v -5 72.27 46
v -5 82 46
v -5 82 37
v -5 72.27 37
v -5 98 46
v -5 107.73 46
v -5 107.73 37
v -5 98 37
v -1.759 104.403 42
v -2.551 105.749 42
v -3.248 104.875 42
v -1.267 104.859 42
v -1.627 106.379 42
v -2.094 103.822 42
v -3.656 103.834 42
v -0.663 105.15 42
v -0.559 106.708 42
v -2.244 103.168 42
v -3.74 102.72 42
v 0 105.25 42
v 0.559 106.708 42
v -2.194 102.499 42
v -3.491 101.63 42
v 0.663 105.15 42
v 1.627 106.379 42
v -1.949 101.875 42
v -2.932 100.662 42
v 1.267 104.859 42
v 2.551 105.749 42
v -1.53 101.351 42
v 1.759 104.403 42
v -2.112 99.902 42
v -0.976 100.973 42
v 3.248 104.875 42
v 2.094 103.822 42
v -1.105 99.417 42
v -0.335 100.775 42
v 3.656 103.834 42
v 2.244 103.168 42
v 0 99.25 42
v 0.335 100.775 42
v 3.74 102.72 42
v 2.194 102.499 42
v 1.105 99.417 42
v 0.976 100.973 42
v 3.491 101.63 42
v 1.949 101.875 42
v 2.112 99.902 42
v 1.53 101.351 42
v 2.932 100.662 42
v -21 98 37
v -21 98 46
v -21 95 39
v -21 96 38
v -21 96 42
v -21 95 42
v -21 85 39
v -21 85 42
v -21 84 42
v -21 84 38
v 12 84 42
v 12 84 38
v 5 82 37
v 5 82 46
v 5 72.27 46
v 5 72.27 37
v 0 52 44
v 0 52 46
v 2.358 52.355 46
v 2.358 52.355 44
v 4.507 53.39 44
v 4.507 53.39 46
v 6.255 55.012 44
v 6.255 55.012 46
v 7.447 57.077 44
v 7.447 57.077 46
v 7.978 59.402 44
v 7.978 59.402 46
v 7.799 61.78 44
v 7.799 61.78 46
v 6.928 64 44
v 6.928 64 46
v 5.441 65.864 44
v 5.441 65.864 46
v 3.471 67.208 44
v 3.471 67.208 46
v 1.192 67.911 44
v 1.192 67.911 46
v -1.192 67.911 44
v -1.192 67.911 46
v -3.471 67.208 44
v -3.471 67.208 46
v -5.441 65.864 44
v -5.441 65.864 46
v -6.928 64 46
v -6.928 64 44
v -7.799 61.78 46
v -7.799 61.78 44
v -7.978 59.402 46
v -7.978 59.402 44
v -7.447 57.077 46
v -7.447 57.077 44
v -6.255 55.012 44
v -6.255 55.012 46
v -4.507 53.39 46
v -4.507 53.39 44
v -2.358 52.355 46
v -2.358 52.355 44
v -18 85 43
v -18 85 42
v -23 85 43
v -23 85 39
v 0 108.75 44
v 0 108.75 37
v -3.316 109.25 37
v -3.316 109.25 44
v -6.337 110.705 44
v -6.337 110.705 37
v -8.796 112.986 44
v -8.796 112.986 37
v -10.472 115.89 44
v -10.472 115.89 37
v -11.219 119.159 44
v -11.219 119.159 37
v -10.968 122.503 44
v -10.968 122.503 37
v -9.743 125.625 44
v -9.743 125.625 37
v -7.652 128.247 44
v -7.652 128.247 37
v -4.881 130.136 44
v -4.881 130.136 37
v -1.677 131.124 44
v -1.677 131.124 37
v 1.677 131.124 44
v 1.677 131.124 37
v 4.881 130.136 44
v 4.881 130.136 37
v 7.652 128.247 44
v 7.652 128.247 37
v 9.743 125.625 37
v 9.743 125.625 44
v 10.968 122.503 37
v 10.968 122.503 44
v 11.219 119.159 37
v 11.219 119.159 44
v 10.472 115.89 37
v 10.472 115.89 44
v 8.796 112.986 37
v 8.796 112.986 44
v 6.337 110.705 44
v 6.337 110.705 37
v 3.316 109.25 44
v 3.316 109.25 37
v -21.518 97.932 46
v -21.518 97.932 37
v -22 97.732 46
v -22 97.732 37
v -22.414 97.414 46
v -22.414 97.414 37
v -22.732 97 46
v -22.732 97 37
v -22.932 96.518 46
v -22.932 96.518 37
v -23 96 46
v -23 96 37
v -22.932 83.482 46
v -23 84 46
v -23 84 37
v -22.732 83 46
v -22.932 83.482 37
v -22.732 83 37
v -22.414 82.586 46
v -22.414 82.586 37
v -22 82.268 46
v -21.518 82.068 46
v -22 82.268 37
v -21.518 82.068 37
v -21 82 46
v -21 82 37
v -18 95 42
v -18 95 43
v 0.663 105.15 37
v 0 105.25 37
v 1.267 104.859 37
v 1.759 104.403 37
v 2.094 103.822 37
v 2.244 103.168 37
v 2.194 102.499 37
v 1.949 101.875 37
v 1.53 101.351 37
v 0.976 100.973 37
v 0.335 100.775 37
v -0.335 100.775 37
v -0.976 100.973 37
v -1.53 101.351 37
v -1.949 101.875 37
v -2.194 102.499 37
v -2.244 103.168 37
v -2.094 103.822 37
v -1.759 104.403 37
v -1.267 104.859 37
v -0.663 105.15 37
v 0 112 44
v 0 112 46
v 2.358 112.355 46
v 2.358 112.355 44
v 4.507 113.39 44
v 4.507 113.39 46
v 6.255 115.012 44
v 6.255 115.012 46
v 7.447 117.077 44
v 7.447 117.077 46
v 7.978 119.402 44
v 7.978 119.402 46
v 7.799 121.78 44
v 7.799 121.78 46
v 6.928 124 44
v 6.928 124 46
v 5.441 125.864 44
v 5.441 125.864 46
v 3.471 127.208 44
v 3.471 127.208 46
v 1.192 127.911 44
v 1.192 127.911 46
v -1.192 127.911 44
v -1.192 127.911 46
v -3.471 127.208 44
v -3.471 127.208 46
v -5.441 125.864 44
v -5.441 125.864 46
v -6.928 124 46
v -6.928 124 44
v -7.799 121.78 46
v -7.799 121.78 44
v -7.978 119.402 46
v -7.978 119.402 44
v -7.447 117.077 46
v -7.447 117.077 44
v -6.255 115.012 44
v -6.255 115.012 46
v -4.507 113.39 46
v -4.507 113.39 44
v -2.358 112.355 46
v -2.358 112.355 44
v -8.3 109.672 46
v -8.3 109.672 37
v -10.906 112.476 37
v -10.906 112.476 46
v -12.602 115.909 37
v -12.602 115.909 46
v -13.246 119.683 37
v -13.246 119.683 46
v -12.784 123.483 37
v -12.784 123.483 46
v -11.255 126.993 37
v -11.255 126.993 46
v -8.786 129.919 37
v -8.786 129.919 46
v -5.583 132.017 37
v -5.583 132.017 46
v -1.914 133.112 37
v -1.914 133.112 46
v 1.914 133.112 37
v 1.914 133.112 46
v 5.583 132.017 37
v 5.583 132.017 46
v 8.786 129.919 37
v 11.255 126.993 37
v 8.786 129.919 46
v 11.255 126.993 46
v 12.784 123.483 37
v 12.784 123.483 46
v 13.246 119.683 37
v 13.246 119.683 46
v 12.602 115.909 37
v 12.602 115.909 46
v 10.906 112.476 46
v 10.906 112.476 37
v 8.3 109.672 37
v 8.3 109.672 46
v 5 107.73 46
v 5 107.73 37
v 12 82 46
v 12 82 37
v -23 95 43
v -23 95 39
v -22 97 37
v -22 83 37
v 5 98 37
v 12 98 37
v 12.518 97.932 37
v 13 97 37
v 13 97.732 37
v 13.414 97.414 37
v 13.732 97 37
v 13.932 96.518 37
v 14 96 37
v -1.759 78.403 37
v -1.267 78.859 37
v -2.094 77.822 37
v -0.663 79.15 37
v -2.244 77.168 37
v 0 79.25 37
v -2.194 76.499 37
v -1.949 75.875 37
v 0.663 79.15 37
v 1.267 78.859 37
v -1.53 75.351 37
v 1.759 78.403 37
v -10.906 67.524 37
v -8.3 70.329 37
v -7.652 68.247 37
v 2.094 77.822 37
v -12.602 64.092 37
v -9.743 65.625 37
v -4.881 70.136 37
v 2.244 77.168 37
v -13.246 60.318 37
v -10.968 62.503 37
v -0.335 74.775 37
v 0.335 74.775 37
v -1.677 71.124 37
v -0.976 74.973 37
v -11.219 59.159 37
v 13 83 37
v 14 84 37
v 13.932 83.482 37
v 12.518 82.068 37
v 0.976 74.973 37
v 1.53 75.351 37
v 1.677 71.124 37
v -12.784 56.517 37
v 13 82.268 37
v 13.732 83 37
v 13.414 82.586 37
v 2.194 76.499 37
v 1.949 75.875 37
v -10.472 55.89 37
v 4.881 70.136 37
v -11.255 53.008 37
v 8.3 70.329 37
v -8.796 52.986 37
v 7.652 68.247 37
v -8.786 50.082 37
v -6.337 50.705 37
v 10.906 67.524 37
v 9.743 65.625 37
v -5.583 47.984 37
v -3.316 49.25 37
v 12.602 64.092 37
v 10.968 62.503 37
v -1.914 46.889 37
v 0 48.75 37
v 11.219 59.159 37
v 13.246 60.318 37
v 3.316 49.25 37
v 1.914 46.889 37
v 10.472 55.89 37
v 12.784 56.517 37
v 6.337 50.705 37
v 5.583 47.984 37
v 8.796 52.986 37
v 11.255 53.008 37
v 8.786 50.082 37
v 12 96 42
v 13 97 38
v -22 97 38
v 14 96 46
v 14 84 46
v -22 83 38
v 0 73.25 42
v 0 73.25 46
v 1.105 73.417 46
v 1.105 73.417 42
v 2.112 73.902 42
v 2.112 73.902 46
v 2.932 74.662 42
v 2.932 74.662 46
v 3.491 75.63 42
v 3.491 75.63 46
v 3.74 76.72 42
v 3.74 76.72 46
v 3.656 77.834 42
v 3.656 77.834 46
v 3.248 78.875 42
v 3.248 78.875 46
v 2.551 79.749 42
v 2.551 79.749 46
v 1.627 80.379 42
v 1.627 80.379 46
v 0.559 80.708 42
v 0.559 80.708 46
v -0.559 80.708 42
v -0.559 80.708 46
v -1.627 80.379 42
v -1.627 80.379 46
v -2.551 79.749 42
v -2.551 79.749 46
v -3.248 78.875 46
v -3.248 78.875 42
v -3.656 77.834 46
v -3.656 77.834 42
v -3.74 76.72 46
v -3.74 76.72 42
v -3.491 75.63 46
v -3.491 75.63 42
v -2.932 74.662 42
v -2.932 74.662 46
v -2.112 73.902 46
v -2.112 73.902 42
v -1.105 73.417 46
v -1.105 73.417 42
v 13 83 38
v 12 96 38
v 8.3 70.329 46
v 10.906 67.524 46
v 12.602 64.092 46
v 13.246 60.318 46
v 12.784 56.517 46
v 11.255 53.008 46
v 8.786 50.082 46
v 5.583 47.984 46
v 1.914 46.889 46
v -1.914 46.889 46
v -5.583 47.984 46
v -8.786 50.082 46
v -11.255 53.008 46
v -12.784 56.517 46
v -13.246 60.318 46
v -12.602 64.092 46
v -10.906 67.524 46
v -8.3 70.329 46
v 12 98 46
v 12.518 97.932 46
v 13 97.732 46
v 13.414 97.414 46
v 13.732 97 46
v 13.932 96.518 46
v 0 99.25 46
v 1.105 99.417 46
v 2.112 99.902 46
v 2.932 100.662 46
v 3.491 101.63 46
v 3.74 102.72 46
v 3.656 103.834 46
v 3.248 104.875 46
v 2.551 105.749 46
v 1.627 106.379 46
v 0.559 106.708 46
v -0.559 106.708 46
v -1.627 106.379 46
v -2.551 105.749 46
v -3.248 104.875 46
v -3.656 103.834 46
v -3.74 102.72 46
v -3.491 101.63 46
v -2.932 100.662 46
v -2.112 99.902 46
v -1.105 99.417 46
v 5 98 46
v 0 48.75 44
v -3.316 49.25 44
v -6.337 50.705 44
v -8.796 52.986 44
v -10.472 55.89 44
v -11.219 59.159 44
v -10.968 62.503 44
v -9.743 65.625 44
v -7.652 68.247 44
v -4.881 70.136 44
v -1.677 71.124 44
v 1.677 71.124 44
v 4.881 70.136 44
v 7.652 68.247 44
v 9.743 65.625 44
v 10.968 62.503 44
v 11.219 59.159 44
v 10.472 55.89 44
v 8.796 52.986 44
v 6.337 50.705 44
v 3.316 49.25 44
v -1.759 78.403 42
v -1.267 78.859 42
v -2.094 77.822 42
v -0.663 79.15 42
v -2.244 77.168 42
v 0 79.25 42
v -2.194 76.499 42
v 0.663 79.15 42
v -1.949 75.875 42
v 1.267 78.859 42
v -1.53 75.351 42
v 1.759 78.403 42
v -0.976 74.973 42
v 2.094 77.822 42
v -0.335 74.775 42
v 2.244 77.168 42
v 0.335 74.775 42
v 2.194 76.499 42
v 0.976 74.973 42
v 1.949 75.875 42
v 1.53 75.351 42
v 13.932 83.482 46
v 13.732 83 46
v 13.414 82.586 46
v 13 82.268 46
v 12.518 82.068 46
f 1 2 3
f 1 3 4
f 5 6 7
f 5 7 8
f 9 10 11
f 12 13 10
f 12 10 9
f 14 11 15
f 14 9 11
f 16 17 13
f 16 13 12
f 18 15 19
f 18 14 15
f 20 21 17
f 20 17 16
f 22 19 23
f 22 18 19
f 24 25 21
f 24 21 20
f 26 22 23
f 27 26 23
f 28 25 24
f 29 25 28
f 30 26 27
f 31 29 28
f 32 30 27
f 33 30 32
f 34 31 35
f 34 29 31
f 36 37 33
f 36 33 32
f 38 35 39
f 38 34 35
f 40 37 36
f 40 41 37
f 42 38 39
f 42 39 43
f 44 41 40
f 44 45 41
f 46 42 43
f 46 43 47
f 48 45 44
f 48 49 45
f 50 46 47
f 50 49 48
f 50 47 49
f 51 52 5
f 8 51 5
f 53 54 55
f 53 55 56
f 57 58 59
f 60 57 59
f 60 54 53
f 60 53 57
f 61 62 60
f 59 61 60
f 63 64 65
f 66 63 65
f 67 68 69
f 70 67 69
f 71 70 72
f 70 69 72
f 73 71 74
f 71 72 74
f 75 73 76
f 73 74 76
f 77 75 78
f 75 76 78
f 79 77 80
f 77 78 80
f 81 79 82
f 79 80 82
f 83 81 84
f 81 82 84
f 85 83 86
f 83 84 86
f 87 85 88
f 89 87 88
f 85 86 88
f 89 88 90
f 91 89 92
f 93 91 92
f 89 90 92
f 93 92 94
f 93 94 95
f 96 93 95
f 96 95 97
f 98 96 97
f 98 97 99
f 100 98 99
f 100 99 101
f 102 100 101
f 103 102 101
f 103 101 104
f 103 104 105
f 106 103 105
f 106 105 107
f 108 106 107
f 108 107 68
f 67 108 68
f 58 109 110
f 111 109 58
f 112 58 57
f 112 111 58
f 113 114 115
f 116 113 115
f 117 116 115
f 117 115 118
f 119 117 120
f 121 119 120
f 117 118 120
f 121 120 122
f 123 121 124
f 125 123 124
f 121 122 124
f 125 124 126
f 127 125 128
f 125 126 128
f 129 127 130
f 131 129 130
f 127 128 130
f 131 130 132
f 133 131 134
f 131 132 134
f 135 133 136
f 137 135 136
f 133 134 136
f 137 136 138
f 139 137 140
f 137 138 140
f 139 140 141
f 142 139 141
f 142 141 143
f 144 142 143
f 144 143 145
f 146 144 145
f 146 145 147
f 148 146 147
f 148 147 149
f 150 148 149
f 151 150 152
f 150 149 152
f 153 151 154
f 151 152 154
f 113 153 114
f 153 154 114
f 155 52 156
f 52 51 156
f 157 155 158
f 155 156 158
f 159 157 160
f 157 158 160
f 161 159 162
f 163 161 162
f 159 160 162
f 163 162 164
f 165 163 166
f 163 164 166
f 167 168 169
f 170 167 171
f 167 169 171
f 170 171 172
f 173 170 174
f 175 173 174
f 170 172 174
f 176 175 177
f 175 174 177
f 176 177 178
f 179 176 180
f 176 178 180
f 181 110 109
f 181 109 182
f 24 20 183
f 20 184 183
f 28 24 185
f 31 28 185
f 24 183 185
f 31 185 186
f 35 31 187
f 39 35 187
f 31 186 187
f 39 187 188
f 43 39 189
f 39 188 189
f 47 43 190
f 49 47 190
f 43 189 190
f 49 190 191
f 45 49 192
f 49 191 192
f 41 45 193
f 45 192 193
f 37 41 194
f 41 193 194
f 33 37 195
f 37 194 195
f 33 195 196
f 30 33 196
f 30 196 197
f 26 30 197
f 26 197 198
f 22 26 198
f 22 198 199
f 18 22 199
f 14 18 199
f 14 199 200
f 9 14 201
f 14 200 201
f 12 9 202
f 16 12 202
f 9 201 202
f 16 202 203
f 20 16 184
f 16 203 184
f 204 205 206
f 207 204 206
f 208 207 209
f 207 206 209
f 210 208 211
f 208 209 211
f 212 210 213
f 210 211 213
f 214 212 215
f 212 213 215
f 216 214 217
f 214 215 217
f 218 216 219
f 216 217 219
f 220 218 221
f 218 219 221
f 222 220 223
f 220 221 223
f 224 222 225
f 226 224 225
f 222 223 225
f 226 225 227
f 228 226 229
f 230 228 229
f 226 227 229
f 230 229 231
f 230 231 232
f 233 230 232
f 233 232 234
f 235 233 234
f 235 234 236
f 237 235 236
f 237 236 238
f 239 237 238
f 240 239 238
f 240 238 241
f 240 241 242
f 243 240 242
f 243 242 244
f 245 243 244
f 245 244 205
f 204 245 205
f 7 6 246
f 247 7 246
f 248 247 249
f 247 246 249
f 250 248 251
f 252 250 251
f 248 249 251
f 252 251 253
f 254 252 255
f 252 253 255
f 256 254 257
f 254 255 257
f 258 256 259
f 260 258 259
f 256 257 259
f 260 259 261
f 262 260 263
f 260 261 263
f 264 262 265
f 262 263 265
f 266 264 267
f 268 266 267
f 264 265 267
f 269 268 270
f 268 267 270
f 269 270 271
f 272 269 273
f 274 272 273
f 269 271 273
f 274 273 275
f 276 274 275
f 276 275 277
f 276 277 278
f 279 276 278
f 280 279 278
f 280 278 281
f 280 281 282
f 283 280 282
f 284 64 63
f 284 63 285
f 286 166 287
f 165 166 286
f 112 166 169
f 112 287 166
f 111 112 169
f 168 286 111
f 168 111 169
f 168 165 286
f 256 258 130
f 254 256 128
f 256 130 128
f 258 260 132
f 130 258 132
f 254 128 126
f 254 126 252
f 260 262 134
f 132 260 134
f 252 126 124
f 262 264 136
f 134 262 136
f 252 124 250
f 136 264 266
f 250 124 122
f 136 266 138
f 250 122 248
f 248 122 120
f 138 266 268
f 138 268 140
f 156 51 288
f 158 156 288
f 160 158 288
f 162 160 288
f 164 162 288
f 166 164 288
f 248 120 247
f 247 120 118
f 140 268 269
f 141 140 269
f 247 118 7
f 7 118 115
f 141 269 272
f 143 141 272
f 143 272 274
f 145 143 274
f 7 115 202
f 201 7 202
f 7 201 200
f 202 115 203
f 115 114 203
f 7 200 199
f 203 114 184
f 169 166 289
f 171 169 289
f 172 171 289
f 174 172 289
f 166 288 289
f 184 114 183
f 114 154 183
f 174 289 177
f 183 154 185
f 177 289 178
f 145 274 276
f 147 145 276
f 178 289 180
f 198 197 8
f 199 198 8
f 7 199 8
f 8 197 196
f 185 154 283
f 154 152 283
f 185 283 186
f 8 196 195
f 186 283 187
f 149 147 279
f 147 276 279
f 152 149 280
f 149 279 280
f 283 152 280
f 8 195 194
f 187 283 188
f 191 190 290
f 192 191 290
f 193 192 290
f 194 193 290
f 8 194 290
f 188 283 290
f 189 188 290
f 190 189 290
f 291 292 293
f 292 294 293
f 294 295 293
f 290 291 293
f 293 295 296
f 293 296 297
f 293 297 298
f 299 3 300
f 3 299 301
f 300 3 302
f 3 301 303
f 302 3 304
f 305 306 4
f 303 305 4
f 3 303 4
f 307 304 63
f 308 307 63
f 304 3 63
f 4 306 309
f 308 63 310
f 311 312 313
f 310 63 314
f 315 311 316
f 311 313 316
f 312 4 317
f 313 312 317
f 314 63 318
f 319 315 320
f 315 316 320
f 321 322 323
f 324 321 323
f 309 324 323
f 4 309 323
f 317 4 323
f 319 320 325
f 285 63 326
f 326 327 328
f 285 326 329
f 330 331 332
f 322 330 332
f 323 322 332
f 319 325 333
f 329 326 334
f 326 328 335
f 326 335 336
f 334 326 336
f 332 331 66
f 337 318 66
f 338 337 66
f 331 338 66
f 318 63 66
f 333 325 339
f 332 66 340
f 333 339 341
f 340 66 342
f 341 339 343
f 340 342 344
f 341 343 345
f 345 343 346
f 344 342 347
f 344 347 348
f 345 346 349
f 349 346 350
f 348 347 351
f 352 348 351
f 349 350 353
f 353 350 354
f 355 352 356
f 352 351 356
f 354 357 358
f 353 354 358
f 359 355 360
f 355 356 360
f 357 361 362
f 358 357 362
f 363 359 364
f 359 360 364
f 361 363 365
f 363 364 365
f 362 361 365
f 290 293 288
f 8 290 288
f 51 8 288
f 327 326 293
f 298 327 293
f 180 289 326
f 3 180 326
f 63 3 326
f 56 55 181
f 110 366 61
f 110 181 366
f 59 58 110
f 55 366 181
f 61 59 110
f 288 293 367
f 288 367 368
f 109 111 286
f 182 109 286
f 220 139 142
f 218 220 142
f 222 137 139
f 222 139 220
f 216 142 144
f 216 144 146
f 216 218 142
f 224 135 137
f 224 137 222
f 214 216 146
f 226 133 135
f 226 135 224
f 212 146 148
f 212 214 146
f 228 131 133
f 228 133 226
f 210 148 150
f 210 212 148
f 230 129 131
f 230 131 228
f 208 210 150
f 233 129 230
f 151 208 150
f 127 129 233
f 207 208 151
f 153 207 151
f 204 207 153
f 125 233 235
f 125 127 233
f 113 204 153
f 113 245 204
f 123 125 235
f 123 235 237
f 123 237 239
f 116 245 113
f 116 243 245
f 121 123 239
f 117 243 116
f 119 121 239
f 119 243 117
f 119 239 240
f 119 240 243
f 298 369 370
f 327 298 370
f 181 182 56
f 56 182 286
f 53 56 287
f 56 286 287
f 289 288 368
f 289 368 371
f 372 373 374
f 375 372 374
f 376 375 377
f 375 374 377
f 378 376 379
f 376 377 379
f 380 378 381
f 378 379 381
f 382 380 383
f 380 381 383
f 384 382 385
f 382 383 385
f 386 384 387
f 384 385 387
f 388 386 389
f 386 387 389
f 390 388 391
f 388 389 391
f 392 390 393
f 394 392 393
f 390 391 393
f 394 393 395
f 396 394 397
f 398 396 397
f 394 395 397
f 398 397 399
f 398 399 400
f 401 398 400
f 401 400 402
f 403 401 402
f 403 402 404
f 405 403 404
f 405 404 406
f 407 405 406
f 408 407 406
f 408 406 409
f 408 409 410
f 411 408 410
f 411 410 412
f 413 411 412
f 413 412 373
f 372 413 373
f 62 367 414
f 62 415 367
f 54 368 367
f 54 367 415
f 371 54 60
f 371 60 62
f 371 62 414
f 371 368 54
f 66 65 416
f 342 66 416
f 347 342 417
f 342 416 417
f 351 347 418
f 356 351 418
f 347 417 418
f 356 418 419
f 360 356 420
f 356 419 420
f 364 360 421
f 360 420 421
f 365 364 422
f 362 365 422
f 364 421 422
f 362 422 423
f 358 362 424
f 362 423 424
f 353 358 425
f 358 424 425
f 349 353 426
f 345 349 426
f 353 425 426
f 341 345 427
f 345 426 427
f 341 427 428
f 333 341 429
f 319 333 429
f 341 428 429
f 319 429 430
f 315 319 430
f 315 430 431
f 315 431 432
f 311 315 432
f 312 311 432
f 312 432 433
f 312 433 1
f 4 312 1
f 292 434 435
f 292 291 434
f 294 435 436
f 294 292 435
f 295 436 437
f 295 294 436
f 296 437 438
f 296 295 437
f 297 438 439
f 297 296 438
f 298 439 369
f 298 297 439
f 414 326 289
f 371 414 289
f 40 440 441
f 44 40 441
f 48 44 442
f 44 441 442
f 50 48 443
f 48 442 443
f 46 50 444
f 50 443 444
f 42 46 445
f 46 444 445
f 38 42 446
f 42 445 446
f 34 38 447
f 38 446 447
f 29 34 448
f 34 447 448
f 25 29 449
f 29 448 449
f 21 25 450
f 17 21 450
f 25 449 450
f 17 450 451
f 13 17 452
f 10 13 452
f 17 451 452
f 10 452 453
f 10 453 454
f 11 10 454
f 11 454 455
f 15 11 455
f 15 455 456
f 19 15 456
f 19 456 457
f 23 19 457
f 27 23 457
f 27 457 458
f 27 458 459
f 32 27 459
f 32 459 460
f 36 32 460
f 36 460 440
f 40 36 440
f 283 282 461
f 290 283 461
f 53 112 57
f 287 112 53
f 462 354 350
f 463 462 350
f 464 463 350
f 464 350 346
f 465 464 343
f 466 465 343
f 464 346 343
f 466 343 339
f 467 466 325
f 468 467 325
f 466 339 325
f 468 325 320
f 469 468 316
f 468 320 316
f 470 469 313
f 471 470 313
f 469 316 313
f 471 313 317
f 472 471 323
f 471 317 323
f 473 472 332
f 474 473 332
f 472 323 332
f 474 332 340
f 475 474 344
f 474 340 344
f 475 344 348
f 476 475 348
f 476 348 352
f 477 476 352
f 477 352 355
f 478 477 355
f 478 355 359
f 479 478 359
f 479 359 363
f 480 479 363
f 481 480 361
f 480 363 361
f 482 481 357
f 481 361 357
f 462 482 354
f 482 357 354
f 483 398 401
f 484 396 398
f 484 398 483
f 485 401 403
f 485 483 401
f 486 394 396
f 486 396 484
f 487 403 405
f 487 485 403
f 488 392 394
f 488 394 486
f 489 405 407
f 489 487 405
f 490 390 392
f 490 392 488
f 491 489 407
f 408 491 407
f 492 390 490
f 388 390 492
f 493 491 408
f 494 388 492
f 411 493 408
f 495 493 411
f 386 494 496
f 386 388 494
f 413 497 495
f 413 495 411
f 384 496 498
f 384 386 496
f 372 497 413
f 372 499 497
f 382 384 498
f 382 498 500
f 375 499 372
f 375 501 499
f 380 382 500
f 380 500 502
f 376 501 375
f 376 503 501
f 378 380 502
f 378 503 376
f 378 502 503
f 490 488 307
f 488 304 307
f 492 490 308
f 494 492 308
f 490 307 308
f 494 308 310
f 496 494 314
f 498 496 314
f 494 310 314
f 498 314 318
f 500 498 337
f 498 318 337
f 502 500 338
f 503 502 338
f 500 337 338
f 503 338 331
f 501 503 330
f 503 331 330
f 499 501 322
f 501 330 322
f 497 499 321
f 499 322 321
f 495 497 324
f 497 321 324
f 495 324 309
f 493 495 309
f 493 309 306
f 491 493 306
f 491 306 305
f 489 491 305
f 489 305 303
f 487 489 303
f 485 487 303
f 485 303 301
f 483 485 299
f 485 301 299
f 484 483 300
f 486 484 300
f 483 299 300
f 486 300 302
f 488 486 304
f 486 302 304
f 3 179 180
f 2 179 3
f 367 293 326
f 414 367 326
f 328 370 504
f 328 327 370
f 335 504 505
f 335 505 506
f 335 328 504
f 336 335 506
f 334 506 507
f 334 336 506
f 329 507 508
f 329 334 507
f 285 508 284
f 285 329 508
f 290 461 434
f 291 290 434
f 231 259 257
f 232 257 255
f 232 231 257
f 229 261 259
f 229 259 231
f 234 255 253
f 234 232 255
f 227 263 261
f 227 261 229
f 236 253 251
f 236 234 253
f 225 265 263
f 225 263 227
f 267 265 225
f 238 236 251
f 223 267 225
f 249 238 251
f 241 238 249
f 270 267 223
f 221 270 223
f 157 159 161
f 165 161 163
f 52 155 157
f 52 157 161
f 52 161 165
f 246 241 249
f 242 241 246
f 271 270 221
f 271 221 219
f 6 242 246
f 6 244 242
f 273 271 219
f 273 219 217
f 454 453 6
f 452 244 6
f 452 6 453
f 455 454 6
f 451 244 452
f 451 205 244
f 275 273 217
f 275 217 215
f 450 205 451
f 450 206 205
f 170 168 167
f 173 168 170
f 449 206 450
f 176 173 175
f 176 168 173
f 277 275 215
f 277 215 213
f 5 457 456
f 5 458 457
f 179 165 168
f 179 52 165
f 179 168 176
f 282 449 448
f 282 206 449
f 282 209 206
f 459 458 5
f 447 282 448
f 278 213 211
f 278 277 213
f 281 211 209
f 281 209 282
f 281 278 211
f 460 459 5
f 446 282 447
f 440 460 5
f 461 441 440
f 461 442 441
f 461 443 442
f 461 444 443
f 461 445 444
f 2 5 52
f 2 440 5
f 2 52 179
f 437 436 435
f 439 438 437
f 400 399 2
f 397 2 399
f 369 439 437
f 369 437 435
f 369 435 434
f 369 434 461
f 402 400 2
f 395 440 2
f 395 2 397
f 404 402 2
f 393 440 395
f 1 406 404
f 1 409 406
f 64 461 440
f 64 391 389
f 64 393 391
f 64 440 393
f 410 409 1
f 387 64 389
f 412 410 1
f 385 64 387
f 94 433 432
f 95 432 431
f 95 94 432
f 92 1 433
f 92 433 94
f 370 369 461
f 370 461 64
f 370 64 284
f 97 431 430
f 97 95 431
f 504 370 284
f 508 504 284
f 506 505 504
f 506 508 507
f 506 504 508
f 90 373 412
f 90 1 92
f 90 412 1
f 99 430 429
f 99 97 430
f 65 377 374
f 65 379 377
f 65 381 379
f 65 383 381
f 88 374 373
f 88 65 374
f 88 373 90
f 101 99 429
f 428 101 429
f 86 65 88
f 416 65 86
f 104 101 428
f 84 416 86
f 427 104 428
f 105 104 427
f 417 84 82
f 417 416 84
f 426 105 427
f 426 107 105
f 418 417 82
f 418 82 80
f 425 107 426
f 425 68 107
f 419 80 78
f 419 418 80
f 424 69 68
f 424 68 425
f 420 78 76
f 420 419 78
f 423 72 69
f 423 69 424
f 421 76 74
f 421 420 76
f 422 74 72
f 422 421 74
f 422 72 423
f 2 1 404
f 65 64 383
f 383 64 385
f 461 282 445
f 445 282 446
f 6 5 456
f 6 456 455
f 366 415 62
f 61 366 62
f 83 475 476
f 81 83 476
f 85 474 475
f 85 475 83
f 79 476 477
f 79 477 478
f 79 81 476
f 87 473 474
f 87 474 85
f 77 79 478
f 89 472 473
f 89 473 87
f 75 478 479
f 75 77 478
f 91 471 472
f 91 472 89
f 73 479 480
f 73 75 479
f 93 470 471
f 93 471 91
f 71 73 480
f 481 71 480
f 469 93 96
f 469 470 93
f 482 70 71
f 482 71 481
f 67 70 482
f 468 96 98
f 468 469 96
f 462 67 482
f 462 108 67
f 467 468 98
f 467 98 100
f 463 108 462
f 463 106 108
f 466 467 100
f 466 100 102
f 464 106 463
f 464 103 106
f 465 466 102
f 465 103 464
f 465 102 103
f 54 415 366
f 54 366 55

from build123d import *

# Parameters (mm, degrees)
PAD028_DEPTH            = 9
SKETCH075_R             = 11.25
POCKET028_DEPTH         = 7
SKETCH076_R             = 8
POCKET029_DEPTH         = 5
SKETCH077_W             = 16
SKETCH077_H             = 37
PAD029_DEPTH            = 9
SKETCH078_W             = 14
SKETCH078_H             = 35
POCKET030_DEPTH         = 1
SKETCH079_W             = 12
SKETCH079_H             = 33
POCKET031_DEPTH         = 5
SKETCH080_W             = 10
SKETCH080_H             = 4
POCKET032_DEPTH         = 5
HOLE007_D               = 4.5
HOLE007_DEPTH           = 25
HOLE007_CBORE_D         = 7.5
HOLE007_CBORE_DEPTH     = 4
FILLET006_R             = 2
BODY010_ROLL_ANGLE      = 180
BODY010_PLACEMENT_ANGLE = -90


with BuildPart() as part:
    # Sketch074 → Pad028 (new body)
    with BuildSketch(Plane.XY):
        with BuildLine():
            ThreePointArc((12.269609, 5), (-13.250782, 0), (12.269609, -5))
            Line((12.269609, -5), (47.729609, -5))
            ThreePointArc((47.729609, -5), (73.25, 0), (47.729609, 5))
            Line((12.269609, 5), (47.729609, 5))
        make_face()
    extrude(amount=PAD028_DEPTH)

    # Sketch075 (on Face6 of Pad028) → Pocket028 (cut)
    with BuildSketch(Plane.XY.offset(9)):
        Circle(SKETCH075_R)
        with Locations((60, 0)):
            Circle(SKETCH075_R)
    extrude(amount=-POCKET028_DEPTH, mode=Mode.SUBTRACT)

    # Sketch076 (on Face4 of Pocket028) → Pocket029 (cut)
    with BuildSketch(Plane(origin=(0, 0, 0), x_dir=(1, 0, 0), z_dir=(0, 0, -1))):
        Circle(SKETCH076_R)
        with Locations((60, 0)):
            Circle(SKETCH076_R)
    extrude(amount=-POCKET029_DEPTH, mode=Mode.SUBTRACT)

    # Sketch077 (on Face4 of Pocket029) → Pad029 (join)
    with BuildSketch(Plane(origin=(0, 0, 0), x_dir=(1, 0, 0), z_dir=(0, 0, -1))):
        with Locations((30, -4.5)):
            Rectangle(SKETCH077_W, SKETCH077_H)
    extrude(amount=-PAD029_DEPTH)

    # Sketch078 (on Face13 of Pad029) → Pocket030 (cut)
    with BuildSketch(Plane.XY.offset(9)):
        with Locations((30, 4.5)):
            Rectangle(SKETCH078_W, SKETCH078_H)
    extrude(amount=-POCKET030_DEPTH, mode=Mode.SUBTRACT)

    # Sketch079 (on Face22 of Pocket030) → Pocket031 (cut)
    with BuildSketch(Plane.XY.offset(9)):
        with Locations((30, 4.5)):
            Rectangle(SKETCH079_W, SKETCH079_H)
    extrude(amount=-POCKET031_DEPTH, mode=Mode.SUBTRACT)

    # Sketch080 (on Face14 of Pocket031) → Pocket032 (cut)
    with BuildSketch(Plane(origin=(0, 23, 0), x_dir=(-1, 0, 0), z_dir=(0, 1, 0))):
        with Locations((-30, 5)):
            Rectangle(SKETCH080_W, SKETCH080_H)
    extrude(amount=-POCKET032_DEPTH, mode=Mode.SUBTRACT)

    # Hole007
    with Locations(Plane(origin=(0, 0, 0), x_dir=(1, 0, 0), z_dir=(0, 0, -1))):
        with Locations((17, 0), (43, 0)):
            CounterBoreHole(HOLE007_D / 2, HOLE007_CBORE_D / 2, HOLE007_CBORE_DEPTH, depth=HOLE007_DEPTH)

    # Fillet006
    fillet006_edges = [part.edges().sort_by_distance(p)[0] for p in [
        (38, 23, 4.5),
        (22, 23, 4.5),
        (22, -14, 4.5),
        (38, -14, 4.5),
    ]]
    fillet(fillet006_edges, radius=FILLET006_R)


with BuildPart() as part_1:
    # Body010 roll: moved
    add(part.part.rotate(Axis((0, 0, 0), (1, 0, 0)), BODY010_ROLL_ANGLE))


with BuildPart() as part_2:
    # Body010 placement: moved
    add(part_1.part.moved(Location((0, 120, 46))).rotate(Axis((0, 120, 46), (0, 0, 1)), BODY010_PLACEMENT_ANGLE))


solid = part_2.part
